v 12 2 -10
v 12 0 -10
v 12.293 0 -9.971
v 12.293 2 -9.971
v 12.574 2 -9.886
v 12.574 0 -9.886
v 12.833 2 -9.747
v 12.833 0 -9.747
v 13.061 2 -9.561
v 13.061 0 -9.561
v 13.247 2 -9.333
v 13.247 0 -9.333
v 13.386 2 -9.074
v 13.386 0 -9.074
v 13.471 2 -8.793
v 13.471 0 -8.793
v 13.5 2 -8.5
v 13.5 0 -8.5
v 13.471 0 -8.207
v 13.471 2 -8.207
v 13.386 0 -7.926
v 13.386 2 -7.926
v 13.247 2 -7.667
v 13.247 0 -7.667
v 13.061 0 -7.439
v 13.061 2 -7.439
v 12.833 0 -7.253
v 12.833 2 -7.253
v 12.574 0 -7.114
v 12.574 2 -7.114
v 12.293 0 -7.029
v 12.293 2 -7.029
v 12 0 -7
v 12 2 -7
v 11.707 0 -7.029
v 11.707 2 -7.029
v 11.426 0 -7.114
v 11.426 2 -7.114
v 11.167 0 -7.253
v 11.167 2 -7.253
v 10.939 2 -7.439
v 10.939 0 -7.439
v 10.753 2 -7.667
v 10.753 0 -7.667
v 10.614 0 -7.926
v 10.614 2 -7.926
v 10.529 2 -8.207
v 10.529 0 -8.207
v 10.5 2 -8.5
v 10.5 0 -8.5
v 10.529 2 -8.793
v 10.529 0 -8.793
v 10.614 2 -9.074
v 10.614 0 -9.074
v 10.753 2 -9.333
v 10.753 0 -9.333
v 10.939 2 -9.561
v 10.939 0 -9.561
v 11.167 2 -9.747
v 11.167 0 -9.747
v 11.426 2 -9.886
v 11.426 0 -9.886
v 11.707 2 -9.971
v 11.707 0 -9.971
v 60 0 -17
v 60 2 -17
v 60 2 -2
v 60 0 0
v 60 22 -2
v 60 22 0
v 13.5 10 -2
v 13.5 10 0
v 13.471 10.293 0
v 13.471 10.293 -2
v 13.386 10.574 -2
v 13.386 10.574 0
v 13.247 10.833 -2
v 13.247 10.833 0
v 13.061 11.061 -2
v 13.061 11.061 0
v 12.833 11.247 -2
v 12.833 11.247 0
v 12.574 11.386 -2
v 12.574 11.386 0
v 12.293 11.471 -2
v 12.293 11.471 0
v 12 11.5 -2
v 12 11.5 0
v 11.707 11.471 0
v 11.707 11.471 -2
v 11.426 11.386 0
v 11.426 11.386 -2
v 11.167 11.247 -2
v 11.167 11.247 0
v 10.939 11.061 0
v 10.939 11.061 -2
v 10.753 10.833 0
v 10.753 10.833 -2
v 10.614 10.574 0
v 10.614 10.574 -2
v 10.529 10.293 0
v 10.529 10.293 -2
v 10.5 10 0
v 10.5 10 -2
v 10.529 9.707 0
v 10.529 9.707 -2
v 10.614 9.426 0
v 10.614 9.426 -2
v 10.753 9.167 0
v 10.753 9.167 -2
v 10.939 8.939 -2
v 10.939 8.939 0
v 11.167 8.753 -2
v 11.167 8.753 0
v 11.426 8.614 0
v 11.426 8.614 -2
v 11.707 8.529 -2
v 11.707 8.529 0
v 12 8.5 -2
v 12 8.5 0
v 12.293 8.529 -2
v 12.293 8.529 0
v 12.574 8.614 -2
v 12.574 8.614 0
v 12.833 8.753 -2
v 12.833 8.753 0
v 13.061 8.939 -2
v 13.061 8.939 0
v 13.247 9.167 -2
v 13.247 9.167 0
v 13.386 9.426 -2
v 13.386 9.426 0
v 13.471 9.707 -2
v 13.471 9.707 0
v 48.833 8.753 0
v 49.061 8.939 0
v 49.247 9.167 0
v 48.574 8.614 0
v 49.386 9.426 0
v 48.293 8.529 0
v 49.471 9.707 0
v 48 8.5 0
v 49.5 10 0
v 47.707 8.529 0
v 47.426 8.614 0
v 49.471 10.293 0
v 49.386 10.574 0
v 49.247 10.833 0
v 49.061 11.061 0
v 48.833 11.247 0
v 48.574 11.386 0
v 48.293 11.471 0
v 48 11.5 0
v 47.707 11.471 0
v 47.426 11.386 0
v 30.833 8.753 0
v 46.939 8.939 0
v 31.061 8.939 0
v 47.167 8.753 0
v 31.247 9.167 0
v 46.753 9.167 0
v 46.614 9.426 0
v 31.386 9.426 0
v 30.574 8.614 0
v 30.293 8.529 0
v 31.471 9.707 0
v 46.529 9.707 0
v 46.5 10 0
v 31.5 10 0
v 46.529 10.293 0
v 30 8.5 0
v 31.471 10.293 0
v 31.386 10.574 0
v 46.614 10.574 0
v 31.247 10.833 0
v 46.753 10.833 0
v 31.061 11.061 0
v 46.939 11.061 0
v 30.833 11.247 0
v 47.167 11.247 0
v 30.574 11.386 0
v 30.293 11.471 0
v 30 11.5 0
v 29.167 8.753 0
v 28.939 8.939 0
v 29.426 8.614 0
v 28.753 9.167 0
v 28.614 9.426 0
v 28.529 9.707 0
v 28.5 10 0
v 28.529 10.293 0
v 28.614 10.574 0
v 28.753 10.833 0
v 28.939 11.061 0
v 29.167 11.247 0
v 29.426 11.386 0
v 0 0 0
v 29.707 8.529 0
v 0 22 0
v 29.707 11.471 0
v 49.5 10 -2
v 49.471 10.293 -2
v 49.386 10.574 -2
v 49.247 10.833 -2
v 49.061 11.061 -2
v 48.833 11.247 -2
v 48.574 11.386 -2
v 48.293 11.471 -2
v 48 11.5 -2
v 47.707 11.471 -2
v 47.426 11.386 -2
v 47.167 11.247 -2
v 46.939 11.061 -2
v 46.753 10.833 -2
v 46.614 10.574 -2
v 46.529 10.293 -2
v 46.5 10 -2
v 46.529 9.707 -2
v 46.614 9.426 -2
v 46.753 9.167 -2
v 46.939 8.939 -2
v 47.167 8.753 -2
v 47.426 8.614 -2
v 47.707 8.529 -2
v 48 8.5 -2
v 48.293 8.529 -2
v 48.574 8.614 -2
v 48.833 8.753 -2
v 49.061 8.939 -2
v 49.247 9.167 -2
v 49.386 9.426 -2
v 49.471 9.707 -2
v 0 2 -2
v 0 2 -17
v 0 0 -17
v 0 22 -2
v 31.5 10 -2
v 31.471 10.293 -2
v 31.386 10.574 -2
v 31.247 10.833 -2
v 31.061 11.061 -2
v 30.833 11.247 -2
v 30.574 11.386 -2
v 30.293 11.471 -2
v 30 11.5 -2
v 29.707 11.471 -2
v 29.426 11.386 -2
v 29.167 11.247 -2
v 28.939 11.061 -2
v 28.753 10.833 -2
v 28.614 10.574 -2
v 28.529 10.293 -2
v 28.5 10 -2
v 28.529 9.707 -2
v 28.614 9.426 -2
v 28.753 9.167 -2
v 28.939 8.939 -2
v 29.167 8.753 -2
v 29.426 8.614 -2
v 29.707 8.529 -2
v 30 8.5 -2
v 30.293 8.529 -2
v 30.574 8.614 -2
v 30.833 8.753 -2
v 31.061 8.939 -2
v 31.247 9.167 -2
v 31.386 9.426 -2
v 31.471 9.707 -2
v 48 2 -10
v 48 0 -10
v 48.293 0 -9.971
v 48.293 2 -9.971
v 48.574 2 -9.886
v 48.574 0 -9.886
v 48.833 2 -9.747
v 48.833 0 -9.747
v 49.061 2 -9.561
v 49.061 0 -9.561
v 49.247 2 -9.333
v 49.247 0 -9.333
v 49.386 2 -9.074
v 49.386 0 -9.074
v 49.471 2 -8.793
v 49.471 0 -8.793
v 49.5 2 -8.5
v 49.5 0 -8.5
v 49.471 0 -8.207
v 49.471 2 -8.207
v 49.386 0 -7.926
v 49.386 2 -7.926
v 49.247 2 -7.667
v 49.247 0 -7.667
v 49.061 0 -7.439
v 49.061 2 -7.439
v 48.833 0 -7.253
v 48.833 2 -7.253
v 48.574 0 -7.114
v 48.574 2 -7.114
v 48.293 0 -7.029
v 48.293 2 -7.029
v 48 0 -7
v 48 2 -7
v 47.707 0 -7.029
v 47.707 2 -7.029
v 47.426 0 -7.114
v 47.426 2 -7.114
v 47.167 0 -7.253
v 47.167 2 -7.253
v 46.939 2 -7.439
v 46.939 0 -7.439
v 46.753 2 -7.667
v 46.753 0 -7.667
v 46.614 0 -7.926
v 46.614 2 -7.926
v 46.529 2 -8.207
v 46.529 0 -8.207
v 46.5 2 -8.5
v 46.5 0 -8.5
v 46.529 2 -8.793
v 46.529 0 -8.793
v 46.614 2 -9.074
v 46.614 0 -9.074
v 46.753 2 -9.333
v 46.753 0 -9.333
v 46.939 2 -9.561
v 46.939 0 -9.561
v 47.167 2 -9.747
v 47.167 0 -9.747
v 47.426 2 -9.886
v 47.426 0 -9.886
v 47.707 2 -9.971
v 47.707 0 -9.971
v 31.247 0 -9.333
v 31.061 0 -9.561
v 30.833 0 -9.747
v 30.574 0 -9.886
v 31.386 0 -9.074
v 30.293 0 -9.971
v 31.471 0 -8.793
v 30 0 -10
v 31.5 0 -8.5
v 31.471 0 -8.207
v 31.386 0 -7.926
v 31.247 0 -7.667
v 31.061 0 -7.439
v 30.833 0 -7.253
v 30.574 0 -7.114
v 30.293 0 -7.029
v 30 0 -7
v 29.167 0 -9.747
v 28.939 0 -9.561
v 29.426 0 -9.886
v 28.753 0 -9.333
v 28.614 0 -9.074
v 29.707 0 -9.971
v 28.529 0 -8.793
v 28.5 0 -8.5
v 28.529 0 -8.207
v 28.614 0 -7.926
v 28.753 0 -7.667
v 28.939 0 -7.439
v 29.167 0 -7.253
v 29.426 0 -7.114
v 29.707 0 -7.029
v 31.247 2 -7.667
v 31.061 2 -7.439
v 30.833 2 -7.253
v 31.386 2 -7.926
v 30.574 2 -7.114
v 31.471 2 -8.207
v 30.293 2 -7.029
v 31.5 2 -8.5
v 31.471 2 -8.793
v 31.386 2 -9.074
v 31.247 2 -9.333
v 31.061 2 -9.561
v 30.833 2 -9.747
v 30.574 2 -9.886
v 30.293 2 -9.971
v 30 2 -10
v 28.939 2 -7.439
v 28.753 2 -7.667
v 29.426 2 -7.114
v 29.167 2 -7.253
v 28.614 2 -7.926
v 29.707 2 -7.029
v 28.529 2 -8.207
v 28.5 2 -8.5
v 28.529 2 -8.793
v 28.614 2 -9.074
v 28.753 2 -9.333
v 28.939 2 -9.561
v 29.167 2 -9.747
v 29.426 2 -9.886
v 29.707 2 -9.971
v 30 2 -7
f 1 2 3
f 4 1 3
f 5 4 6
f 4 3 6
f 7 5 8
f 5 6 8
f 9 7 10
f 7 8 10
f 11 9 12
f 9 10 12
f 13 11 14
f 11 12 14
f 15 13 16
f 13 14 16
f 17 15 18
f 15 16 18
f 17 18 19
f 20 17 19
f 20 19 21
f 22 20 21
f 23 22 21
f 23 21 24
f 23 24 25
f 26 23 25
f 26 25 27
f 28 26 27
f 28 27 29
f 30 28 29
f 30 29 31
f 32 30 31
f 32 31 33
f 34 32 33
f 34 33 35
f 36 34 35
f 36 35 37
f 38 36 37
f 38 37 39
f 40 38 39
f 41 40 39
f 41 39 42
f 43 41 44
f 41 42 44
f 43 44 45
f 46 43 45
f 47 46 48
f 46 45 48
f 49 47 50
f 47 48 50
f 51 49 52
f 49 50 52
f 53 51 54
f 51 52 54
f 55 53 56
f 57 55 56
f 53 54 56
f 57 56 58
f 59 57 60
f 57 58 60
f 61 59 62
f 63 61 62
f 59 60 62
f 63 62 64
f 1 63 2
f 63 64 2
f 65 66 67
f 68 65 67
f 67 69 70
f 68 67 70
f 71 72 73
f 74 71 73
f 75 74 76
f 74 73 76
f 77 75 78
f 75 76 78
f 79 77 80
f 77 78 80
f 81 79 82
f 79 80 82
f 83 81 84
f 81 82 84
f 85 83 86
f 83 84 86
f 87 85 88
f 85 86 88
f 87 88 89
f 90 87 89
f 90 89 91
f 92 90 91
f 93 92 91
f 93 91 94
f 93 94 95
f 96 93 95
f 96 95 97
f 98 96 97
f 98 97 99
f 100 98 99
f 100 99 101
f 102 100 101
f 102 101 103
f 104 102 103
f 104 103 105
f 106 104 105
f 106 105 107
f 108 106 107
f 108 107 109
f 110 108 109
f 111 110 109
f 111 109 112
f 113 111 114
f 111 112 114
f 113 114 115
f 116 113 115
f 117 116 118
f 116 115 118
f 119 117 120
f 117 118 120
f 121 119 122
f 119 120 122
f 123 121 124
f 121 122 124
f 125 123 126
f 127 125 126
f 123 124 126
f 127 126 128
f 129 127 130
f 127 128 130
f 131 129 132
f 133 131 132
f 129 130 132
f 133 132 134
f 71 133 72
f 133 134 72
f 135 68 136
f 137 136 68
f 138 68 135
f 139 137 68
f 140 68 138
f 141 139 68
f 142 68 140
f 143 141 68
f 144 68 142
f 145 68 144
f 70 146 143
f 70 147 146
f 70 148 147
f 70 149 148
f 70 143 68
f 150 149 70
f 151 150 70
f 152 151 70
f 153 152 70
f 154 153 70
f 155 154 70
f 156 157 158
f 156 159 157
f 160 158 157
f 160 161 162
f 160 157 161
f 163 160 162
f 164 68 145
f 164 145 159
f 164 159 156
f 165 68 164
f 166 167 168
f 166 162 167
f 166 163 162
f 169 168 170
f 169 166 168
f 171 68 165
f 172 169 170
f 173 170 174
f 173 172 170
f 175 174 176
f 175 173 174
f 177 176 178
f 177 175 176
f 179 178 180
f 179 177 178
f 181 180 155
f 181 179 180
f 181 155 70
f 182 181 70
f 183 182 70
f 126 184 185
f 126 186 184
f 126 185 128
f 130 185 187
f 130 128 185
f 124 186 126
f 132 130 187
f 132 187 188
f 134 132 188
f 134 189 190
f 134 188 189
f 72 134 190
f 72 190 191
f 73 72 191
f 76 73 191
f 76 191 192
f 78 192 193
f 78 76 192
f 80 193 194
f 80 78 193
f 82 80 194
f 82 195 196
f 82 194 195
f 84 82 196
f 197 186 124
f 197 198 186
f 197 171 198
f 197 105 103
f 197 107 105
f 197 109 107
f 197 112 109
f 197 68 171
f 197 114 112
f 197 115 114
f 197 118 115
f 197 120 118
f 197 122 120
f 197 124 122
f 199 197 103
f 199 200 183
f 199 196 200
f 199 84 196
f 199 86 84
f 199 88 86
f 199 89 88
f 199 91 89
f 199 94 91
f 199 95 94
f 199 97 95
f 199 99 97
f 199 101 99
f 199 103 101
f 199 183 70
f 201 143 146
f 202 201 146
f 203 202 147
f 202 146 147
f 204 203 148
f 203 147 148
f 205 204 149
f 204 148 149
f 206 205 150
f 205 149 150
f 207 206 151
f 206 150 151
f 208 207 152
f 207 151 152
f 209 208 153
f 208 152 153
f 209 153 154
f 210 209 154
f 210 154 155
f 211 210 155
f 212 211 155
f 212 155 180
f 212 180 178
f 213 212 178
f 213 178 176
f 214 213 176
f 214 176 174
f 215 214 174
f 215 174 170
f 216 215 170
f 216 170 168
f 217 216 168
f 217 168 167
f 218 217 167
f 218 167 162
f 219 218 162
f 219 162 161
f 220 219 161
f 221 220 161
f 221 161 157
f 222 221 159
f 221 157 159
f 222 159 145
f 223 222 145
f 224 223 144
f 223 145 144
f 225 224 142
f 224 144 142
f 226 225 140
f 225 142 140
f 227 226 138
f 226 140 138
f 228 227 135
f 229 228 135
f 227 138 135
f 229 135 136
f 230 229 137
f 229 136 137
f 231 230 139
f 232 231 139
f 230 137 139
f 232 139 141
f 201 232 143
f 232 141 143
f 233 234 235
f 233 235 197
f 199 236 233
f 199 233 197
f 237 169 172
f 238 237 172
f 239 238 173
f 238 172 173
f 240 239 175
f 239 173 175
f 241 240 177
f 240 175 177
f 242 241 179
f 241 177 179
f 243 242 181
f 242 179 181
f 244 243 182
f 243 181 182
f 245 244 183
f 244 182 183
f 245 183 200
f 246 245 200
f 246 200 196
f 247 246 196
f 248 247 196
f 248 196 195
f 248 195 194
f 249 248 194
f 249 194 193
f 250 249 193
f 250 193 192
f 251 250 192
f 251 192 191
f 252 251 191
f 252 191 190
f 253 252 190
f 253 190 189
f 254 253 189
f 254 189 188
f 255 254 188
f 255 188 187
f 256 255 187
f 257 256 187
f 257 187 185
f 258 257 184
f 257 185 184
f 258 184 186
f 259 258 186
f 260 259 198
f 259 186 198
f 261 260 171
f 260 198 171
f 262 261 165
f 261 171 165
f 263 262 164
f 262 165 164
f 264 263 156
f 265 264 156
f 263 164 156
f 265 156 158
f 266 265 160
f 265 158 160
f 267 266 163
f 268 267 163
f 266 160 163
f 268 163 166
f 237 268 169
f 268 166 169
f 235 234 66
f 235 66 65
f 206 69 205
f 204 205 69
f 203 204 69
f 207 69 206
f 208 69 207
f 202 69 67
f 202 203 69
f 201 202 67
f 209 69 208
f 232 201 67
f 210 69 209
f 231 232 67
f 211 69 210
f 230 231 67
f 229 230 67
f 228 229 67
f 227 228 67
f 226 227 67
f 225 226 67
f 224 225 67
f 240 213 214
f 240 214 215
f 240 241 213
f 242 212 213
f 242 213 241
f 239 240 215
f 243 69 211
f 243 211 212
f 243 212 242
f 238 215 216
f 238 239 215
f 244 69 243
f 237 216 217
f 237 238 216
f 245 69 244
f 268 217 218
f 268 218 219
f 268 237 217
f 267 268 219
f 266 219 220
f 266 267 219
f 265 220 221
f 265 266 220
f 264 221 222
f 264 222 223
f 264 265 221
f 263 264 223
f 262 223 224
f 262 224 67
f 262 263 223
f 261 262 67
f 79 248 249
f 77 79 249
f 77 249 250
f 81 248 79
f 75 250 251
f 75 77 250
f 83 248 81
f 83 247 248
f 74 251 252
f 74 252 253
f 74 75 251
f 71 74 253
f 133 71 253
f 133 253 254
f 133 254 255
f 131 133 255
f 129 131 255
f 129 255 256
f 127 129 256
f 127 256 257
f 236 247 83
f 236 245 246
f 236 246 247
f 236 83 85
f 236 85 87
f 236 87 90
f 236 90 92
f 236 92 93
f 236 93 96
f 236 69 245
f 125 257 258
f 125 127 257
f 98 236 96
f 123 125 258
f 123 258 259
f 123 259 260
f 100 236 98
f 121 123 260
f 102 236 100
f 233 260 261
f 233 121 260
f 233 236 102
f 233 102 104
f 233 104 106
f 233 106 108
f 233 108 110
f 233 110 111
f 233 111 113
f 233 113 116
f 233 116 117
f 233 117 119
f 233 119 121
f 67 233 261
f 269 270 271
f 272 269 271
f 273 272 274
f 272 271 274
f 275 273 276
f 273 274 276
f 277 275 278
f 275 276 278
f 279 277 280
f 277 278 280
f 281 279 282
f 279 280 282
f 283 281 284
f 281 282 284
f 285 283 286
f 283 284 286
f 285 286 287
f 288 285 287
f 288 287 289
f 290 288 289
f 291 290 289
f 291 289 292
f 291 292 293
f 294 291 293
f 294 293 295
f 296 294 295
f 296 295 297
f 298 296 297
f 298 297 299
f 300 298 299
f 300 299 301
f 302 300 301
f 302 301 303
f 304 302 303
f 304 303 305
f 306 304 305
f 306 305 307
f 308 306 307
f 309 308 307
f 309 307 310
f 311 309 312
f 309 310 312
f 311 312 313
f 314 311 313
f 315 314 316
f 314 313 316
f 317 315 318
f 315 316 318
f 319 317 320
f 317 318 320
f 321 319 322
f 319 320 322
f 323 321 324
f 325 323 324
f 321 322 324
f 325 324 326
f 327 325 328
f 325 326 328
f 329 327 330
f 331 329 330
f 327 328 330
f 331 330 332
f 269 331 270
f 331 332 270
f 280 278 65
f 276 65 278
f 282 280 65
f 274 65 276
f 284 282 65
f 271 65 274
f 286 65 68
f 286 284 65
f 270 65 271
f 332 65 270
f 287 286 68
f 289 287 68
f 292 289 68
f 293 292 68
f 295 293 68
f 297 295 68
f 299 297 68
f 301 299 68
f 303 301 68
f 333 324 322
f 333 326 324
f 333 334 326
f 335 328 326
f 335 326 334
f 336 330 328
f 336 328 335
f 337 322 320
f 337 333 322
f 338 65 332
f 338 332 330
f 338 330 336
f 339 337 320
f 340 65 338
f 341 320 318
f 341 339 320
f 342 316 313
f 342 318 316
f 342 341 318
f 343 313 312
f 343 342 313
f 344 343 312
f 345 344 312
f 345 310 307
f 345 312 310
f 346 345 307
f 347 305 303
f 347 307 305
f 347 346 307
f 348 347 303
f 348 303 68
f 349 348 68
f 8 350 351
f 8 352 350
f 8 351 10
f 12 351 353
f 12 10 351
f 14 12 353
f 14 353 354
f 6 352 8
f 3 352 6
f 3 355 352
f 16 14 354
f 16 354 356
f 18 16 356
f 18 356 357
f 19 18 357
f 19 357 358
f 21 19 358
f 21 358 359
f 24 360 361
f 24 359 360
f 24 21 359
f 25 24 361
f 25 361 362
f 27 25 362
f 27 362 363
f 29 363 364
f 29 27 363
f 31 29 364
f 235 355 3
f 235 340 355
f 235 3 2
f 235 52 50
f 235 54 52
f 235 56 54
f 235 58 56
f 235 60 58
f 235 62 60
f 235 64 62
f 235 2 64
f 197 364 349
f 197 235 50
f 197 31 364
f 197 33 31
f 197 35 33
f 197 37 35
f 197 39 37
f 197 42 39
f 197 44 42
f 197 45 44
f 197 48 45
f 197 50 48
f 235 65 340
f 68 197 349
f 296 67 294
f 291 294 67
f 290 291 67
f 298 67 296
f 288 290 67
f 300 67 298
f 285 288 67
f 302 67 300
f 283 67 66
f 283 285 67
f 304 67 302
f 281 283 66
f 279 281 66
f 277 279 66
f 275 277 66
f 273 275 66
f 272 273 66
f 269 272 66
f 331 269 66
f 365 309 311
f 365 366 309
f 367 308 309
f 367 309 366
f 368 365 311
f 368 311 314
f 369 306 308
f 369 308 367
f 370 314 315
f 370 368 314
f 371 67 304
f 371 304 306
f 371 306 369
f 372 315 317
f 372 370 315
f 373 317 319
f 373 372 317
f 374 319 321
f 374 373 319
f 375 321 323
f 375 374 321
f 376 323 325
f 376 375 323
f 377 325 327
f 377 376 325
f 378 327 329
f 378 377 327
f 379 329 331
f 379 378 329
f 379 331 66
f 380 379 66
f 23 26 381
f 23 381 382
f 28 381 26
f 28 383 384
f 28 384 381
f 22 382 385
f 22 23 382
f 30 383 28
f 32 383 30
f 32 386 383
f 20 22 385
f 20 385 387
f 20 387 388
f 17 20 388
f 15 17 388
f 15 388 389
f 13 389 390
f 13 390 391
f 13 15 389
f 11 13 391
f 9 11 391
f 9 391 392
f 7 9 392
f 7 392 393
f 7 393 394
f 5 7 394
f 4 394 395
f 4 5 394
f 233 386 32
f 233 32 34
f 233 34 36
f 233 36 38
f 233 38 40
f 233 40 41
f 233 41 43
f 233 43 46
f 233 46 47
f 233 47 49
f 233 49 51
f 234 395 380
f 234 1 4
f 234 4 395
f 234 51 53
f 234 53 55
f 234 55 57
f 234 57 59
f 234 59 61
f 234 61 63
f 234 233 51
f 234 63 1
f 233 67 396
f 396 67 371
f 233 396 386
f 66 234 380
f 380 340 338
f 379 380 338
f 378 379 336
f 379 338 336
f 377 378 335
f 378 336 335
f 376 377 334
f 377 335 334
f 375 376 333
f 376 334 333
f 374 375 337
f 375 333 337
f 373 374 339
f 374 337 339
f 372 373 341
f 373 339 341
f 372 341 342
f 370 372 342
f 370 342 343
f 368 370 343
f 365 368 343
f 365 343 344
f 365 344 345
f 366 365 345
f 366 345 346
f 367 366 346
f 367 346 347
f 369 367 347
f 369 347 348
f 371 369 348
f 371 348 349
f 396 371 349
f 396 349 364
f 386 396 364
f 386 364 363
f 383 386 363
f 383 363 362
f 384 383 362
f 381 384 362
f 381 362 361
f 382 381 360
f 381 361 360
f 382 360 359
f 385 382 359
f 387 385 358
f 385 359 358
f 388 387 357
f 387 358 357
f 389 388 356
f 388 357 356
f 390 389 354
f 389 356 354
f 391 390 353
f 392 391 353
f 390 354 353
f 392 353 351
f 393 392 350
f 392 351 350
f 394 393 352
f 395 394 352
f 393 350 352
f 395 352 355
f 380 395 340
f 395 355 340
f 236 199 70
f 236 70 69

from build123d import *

# Parameters (mm, degrees)
BOSS_EXTRUDE1_DEPTH = 60
SKETCH2_R           = 1.5
CUT_EXTRUDE1_DEPTH  = 10
SKETCH3_R           = 1.5
CUT_EXTRUDE2_DEPTH  = 10


with BuildPart() as part:
    # Sketch1 → Boss-Extrude1 (new body)
    with BuildSketch(Plane(origin=(0, 0, 0), x_dir=(0, 0, -1), z_dir=(1, 0, 0))):
        Polygon((0, 0), (0, 22), (2, 22), (2, 2), (17, 2), (17, 0), align=None)
    extrude(amount=BOSS_EXTRUDE1_DEPTH)

    # Sketch2 → Cut-Extrude1 (cut)
    with BuildSketch(Plane.XZ):
        with Locations(Location((30, -8.5, 0), (0, 0, 270))):
            Circle(SKETCH2_R)
        with Locations(Location((12, -8.5, 0), (0, 0, 270))):
            Circle(SKETCH2_R)
        with Locations(Location((48, -8.5, 0), (0, 0, 270))):
            Circle(SKETCH2_R)
    extrude(amount=-CUT_EXTRUDE1_DEPTH, mode=Mode.SUBTRACT)

    # Sketch3 → Cut-Extrude2 (cut)
    with BuildSketch(Plane.XY):
        with Locations((30, 10)):
            Circle(SKETCH3_R)
        with Locations((12, 10)):
            Circle(SKETCH3_R)
        with Locations((48, 10)):
            Circle(SKETCH3_R)
    extrude(amount=-CUT_EXTRUDE2_DEPTH, mode=Mode.SUBTRACT)


solid = part.part
